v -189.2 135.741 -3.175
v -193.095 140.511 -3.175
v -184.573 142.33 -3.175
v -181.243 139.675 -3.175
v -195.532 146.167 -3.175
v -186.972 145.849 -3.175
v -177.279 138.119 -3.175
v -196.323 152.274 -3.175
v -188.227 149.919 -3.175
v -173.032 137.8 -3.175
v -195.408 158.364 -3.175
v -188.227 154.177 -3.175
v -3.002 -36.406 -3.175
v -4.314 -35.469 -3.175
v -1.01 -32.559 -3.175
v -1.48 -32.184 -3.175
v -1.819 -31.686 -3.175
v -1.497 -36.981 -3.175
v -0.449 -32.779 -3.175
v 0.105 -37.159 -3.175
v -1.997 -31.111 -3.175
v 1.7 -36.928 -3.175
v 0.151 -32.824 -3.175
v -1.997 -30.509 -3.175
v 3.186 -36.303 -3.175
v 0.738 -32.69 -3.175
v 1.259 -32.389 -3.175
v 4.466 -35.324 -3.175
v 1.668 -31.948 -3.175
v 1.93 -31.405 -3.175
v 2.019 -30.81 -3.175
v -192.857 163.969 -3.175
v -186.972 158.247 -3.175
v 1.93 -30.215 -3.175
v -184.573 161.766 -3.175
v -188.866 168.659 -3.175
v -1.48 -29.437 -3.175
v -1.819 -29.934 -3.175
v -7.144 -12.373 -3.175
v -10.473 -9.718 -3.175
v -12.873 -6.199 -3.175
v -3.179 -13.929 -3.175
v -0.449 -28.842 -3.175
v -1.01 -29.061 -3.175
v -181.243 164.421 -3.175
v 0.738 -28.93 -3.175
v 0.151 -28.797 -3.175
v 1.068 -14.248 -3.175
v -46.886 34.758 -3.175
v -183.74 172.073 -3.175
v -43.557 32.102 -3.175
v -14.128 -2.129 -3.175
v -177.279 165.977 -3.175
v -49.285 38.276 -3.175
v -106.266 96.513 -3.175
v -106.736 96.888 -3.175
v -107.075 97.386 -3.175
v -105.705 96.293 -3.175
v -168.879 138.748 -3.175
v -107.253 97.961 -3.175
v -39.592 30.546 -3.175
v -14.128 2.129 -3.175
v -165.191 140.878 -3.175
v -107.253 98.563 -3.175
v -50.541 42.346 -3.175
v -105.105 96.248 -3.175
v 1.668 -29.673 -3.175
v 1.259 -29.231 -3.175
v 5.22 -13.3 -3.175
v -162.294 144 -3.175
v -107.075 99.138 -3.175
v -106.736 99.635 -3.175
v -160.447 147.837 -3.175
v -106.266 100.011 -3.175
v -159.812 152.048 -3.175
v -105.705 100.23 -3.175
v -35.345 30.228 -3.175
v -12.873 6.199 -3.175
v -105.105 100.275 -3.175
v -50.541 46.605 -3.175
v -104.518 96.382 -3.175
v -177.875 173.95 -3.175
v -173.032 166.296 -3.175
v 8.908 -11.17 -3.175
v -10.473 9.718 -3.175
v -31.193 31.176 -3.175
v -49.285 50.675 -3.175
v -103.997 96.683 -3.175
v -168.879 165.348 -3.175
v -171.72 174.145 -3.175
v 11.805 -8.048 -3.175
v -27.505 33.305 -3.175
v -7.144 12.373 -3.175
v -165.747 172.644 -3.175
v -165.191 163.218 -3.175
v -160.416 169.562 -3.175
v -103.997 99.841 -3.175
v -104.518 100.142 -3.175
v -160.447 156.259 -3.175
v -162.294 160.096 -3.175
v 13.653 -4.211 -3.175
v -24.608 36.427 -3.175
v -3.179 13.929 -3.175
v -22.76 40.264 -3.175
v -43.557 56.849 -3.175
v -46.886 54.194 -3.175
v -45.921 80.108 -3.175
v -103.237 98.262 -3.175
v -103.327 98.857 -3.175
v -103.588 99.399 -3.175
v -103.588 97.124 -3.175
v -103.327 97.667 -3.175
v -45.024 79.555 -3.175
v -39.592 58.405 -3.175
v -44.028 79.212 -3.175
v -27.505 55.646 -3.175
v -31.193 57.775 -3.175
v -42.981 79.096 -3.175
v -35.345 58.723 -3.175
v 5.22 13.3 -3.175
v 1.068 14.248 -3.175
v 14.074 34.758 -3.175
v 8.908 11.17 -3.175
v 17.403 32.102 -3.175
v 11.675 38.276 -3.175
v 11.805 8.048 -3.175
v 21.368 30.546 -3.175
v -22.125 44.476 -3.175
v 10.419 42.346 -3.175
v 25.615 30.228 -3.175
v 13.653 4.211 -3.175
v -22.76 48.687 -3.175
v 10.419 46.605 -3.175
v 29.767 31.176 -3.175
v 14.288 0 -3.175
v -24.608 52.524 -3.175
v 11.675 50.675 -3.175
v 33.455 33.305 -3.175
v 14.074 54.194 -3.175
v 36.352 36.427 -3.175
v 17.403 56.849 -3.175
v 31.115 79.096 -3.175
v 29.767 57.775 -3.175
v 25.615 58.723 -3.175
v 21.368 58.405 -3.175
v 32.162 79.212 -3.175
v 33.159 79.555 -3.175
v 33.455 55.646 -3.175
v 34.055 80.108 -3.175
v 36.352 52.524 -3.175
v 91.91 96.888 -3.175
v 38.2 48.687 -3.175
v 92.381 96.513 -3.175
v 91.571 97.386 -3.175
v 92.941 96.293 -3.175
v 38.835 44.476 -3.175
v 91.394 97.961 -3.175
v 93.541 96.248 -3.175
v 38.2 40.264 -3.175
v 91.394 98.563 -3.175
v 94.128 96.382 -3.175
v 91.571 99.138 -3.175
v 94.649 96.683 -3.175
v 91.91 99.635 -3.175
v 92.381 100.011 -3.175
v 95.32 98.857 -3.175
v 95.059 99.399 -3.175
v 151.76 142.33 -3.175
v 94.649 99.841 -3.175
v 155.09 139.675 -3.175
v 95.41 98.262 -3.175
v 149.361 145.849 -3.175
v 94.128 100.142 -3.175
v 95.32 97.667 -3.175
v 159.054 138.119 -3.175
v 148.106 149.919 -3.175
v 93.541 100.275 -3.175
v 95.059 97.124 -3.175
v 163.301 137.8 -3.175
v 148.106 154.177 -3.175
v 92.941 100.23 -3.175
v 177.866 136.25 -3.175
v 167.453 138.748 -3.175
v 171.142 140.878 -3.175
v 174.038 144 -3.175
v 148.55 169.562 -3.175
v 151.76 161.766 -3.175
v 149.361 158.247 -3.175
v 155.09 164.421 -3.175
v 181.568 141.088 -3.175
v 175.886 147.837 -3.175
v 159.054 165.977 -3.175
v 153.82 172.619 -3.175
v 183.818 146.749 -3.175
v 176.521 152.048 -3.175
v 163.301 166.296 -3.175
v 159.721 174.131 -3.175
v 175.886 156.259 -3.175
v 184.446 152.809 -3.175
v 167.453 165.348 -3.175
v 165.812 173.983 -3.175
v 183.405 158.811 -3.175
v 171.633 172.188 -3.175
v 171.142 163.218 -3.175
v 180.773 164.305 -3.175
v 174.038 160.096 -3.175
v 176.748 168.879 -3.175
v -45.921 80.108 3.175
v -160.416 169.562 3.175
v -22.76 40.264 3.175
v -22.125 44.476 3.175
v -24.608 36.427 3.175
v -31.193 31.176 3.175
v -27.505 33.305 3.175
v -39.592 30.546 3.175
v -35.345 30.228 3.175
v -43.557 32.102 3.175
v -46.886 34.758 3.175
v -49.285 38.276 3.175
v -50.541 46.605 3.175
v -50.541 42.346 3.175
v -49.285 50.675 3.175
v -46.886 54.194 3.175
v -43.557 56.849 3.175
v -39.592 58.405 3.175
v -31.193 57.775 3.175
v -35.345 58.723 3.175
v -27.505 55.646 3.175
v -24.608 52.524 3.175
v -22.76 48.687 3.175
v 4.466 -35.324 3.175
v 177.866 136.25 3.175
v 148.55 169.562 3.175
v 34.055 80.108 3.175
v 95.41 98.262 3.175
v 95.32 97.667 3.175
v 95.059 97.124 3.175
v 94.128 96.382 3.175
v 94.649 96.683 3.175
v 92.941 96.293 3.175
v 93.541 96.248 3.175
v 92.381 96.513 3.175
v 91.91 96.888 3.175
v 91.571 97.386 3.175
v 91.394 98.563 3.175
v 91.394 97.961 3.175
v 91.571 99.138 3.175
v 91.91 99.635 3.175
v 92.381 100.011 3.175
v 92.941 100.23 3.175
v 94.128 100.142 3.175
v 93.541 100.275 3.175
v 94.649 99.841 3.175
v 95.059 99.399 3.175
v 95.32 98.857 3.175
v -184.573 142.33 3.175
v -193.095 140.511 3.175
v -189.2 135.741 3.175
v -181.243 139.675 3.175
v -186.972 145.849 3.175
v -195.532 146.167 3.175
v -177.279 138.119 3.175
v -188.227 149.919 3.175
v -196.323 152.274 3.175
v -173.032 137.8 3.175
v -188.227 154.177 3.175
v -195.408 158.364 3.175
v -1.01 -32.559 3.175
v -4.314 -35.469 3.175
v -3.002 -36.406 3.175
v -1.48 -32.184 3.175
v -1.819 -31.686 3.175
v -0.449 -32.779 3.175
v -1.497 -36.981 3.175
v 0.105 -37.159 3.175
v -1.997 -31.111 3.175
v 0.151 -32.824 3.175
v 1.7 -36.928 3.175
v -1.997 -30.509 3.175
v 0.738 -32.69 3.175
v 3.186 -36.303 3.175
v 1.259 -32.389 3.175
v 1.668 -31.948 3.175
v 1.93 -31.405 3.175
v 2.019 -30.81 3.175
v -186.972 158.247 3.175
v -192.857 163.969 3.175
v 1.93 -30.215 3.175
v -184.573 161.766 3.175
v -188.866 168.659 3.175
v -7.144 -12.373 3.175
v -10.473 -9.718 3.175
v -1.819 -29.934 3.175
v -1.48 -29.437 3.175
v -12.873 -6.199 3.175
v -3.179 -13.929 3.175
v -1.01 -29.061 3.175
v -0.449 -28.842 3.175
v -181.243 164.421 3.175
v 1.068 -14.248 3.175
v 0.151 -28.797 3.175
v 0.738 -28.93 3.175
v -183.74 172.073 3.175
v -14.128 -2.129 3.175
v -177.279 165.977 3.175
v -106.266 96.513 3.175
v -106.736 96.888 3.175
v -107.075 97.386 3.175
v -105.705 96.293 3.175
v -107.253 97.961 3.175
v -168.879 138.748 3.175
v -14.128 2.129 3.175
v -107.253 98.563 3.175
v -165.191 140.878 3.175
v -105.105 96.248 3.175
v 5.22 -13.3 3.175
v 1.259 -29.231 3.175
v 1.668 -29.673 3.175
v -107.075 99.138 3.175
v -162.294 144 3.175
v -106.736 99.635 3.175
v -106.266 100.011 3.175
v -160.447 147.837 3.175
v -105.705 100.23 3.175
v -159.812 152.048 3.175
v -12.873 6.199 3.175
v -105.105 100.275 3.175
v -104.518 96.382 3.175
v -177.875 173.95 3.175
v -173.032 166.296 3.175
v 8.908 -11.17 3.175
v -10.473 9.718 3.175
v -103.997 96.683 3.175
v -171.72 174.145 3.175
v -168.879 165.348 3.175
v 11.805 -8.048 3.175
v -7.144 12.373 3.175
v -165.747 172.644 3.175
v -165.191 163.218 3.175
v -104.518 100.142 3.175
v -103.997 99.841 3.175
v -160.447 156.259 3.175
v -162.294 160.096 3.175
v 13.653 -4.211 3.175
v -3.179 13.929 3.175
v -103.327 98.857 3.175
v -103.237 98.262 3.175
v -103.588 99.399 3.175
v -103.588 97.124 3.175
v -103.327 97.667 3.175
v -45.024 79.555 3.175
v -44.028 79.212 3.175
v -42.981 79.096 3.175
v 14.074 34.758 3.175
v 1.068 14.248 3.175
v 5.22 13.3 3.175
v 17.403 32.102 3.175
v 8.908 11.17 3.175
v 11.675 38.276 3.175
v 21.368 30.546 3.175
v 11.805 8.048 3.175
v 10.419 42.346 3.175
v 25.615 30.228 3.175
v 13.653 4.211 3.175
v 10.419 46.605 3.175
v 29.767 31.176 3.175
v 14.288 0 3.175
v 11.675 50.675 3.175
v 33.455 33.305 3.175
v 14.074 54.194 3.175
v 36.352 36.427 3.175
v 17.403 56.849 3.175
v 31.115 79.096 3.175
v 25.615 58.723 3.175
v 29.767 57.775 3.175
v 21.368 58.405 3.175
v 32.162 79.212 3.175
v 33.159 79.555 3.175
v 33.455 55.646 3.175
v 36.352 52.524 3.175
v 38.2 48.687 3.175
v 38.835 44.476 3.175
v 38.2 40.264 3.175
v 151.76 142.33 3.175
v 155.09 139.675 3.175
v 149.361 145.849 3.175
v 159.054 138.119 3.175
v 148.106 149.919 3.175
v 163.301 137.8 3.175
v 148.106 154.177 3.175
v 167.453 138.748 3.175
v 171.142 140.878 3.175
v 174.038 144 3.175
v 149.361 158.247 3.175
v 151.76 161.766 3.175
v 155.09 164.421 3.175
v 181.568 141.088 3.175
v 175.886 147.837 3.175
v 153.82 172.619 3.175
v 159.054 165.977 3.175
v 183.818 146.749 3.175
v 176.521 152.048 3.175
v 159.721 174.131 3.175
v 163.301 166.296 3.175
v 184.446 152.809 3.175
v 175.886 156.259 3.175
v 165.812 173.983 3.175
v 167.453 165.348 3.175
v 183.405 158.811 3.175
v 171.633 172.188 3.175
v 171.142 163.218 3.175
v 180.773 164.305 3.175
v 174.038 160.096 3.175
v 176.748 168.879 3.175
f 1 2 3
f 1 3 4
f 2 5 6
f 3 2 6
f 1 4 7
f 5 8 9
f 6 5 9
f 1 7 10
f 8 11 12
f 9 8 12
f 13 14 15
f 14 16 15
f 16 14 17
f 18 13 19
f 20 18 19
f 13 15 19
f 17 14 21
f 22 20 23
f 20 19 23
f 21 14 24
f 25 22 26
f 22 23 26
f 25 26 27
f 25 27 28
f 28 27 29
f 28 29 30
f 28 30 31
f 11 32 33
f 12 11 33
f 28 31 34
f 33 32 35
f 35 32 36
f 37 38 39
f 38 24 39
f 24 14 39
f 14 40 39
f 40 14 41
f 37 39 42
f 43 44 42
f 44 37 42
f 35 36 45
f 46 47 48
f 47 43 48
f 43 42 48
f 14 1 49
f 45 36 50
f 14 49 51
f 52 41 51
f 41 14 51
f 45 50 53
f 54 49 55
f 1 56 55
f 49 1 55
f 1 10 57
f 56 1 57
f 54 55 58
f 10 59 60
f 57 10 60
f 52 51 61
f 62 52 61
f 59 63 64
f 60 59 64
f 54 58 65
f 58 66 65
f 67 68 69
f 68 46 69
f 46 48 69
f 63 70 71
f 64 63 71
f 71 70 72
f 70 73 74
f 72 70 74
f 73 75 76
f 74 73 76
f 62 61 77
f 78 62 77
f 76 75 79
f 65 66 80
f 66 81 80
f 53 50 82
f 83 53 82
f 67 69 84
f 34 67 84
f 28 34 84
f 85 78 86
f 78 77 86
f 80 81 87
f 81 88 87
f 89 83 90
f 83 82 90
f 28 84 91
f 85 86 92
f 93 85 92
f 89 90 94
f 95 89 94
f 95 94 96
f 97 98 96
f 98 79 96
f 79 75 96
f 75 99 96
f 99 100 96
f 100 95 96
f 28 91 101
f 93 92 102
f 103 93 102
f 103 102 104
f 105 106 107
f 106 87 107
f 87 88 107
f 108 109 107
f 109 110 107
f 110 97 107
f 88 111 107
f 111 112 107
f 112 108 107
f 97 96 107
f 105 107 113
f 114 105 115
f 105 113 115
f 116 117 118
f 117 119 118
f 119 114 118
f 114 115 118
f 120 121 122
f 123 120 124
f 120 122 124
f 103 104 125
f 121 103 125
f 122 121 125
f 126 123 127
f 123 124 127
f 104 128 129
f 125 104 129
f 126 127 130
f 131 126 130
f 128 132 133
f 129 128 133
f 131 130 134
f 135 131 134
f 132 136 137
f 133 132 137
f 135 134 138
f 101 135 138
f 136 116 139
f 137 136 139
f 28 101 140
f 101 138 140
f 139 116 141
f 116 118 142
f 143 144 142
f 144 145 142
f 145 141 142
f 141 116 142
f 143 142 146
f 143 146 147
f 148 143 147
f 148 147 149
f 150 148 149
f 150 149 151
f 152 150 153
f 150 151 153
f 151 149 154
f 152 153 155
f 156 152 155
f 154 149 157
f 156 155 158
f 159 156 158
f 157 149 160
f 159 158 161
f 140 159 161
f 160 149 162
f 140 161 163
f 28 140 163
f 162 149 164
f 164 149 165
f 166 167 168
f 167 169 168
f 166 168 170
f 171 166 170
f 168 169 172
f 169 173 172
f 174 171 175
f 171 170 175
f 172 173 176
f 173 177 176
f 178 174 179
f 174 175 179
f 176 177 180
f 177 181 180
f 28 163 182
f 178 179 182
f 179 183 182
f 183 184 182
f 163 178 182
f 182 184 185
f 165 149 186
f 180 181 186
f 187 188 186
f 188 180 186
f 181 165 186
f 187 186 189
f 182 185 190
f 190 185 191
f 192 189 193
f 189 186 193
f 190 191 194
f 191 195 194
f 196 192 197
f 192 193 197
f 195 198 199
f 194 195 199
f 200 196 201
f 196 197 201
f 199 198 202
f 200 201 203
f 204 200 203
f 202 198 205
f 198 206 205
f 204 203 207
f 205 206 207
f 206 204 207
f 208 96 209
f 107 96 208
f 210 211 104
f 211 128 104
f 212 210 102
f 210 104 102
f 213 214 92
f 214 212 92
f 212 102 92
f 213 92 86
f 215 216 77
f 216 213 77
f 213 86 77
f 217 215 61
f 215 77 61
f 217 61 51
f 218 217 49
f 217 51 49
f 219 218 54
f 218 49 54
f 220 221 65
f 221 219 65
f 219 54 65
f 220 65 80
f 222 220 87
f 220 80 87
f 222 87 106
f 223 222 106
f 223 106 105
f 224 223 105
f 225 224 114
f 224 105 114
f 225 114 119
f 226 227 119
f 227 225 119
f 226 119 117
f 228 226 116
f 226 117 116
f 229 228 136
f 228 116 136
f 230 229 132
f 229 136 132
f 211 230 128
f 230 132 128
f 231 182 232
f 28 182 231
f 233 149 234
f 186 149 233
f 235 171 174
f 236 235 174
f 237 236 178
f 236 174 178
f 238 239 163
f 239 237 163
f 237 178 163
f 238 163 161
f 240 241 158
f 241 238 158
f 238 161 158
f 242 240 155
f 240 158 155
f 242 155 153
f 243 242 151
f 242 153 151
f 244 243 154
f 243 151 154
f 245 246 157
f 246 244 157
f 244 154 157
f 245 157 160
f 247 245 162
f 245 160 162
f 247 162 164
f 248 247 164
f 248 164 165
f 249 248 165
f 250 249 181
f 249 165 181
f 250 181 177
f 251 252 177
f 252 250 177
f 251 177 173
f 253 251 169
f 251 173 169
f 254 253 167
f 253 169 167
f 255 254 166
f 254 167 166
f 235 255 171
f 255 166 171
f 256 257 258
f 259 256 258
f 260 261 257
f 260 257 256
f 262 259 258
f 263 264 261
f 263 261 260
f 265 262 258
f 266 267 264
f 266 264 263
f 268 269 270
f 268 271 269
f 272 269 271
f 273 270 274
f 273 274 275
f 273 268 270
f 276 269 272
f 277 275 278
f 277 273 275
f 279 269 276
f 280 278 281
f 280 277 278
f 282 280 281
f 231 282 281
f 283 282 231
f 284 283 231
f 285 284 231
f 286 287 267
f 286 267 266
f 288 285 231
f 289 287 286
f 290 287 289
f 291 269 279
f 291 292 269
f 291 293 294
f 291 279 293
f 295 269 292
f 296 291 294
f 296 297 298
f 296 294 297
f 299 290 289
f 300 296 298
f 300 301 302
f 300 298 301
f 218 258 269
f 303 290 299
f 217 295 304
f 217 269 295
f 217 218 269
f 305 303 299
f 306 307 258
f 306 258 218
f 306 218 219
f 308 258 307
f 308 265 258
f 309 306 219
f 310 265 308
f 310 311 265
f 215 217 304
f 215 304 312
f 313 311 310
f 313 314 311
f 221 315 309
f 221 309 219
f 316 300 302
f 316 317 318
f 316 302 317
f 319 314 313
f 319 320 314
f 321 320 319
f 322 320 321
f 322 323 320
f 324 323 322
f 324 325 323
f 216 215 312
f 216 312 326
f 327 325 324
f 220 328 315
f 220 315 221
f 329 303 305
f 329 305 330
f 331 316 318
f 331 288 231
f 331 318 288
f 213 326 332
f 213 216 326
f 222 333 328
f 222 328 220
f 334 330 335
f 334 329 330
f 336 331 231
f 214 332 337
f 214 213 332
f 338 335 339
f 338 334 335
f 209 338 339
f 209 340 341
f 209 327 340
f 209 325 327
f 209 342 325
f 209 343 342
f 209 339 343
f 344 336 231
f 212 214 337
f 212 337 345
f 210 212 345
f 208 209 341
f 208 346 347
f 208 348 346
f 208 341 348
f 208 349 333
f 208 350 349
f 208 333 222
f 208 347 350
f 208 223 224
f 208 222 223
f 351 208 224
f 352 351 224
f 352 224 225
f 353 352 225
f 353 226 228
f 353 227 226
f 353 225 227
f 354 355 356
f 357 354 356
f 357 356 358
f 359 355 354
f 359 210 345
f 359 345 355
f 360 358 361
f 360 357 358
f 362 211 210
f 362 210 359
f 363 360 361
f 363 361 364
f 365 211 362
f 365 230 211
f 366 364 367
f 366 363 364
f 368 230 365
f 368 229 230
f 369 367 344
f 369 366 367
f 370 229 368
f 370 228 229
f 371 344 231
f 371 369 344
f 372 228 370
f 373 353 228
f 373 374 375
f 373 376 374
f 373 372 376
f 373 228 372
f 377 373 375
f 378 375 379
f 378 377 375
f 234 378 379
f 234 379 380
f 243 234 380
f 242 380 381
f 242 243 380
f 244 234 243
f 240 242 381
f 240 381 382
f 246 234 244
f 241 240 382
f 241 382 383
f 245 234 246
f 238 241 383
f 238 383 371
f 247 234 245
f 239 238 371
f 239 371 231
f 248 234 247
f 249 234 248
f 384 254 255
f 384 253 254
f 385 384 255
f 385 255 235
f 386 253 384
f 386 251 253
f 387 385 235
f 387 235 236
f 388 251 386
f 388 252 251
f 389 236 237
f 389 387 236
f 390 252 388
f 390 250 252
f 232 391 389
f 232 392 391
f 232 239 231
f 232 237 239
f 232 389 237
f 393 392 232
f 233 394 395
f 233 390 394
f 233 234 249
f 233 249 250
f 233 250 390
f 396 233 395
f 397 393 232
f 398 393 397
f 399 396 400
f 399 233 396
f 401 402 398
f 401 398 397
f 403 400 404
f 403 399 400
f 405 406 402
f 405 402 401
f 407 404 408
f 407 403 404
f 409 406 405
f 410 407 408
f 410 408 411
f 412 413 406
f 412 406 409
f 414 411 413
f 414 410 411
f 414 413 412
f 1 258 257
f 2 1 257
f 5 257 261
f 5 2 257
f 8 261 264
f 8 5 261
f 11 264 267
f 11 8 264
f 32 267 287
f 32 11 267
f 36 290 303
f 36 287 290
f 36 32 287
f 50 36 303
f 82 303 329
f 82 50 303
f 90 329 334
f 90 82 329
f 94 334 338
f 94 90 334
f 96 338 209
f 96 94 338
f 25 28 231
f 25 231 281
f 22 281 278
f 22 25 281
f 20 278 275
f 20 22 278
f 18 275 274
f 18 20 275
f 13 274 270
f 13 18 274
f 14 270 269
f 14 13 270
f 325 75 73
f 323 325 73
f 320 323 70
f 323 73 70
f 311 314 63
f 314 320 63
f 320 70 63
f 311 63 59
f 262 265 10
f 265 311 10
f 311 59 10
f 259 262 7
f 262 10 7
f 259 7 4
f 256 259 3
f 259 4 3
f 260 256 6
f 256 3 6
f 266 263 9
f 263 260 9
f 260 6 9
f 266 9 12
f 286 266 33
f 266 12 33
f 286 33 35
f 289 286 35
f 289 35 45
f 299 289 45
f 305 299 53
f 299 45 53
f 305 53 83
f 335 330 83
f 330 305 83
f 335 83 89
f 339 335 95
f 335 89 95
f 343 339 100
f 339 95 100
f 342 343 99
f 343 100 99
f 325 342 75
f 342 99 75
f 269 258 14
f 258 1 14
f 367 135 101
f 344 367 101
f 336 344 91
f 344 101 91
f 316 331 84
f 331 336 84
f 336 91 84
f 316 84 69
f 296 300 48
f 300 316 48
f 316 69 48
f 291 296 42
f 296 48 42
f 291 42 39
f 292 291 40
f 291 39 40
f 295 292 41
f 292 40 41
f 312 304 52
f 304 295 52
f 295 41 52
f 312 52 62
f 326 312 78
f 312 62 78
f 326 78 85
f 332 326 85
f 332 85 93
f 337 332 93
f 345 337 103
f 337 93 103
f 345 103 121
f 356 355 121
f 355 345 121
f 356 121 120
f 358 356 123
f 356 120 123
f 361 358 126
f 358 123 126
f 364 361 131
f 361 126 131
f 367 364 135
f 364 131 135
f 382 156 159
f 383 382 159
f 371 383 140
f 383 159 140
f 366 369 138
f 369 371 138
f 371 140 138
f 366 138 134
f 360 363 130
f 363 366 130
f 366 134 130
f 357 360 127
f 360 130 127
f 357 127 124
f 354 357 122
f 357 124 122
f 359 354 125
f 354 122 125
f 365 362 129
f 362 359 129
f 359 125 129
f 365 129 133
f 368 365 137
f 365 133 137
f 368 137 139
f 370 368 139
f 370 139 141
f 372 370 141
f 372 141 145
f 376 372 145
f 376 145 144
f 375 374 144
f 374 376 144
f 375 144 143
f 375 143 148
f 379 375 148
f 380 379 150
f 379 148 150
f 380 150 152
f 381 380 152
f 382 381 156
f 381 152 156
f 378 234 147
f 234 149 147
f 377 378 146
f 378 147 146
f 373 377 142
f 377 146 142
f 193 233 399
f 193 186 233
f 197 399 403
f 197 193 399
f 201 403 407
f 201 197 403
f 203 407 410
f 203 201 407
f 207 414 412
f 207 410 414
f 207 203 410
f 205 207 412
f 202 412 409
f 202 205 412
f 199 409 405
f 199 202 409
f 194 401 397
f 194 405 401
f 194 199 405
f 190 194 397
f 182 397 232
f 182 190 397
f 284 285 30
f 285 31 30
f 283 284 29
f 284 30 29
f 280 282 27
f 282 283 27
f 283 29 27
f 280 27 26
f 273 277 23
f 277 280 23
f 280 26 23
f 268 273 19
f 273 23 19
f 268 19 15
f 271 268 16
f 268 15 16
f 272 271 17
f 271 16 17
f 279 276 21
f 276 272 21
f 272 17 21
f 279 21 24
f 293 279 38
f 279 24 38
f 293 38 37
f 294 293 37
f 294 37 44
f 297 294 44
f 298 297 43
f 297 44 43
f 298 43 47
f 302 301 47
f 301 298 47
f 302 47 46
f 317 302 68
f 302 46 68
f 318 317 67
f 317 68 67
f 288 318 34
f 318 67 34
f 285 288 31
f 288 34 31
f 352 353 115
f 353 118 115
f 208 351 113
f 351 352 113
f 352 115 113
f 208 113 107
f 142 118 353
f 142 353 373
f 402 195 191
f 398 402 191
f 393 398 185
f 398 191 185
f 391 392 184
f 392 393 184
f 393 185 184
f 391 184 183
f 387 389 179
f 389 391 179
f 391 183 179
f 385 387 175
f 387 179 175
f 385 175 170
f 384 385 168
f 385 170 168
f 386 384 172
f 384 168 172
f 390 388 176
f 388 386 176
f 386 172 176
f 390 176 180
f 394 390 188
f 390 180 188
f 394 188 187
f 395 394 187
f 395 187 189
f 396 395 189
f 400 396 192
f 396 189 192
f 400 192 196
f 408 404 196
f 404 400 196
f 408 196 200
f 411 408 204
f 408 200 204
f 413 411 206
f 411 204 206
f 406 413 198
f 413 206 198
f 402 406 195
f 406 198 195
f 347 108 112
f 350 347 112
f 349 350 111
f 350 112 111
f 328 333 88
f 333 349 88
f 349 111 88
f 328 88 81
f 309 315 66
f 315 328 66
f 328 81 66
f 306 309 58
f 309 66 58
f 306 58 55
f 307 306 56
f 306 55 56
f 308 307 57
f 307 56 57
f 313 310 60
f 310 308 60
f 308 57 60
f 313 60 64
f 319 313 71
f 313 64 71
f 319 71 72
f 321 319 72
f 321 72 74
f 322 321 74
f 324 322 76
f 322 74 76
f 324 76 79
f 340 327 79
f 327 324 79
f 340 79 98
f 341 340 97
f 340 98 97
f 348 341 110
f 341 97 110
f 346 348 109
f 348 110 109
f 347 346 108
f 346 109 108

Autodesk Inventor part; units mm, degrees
ref_plane "YZ Plane" through (0, 0, 0) normal (1, 0, 0) x (0, 1, 0)
ref_plane "XZ Plane" through (0, 0, 0) normal (0, 1, 0) x (-1, 0, 0)
ref_plane "XY Plane" through (0, 0, 0) normal (0, 0, 1) x (1, 0, 0)
sketch "Sketch1" plane through (0, 0, 0) normal (0, 0, 1) x (1, 0, 0)
  circle A0 centre (0, 0) radius 20.32 construction
  circle A1 centre (0, 0) radius 22.86 construction
  circle A2 centre (24.5471, 44.4756) radius 30.48 construction
  circle A3 centre (-36.4129, 44.4756) radius 30.48 construction
  circle A4 centre (-36.4129, 44.4756) radius 33.02 construction
  line L0 (-15.4952, 18.9262) -> (-14.4815, 17.688)
  circle A5 centre (24.5471, 44.4756) radius 33.02 construction
  circle A6 centre (24.5471, 44.4756) radius 14.2875
  circle A7 centre (-36.4129, 44.4756) radius 14.2875
  circle A8 centre (0, 0) radius 14.2875
  circle A9 centre (24.5471, 44.4756) radius 19.1008 construction
  circle A10 centre (24.5471, 44.4756) radius 21.0058 construction
  circle A11 centre (-36.4129, 44.4756) radius 19.1008 construction
  circle A12 centre (-36.4129, 44.4756) radius 21.0058 construction
  line L1 (-36.4129, 44.4756) -> (-174.0993, 152.048) construction
  line L2 (24.5471, 44.4756) -> (162.2336, 152.048) construction
  circle A13 centre (-174.0993, 152.048) radius 14.2875
  circle A14 centre (162.2336, 152.048) radius 14.2875
  circle A15 centre (-174.0993, 152.048) radius 22.225 construction
  circle A16 centre (162.2336, 152.048) radius 22.225 construction
  line L3 (-160.4162, 169.5616) -> (-45.921, 80.1081)
  line L4 (-42.9811, 79.0958) -> (31.1154, 79.0958)
  arc A17 (31.1154, 79.0958) -> (34.0553, 80.1081) centre (31.1154, 83.871) ccw
  arc A18 (-45.921, 80.1081) -> (-42.9811, 79.0958) centre (-42.9811, 83.871) ccw
  line L5 (34.0553, 80.1081) -> (148.5505, 169.5616)
  line L6 (-36.4129, 79.0958) -> (-36.4129, 77.4956) construction
  arc A19 (177.8656, 136.2496) -> (148.5505, 169.5616) centre (162.2336, 152.048) ccw
  arc A20 (-160.4162, 169.5616) -> (-189.2001, 135.7411) centre (-174.0993, 152.048) ccw
  circle A21 centre (-105.2561, 98.2618) radius 2.0193
  circle A22 centre (0, -30.8102) radius 6.35 construction
  circle A23 centre (0, -30.8102) radius 2.0193
  line L7 (0, -22.86) -> (0, -24.4602)
  line L8 (-189.2001, 135.7411) -> (-4.3145, -35.4693)
  line L9 (177.8656, 136.2496) -> (4.4663, -35.324)
  arc A24 (-4.3145, -35.4693) -> (4.4663, -35.324) centre (0, -30.8102) ccw
  circle A25 centre (-105.2561, 98.2618) radius 6.35 construction
  circle A26 centre (93.3904, 98.2618) radius 6.35 construction
  circle A27 centre (93.3904, 98.2618) radius 2.0193
  circle A28 centre (-174.0993, 152.048) radius 50.8 construction
  circle A29 centre (162.2336, 152.048) radius 50.8 construction
  line L10 (-333.708, 192.5945) -> (-312.3217, 152.048) construction
  dimension "d0" = 40.64
  dimension "d3" = 2.54
  dimension "d9" = 60.96
  dimension "d10" = 2.54
  dimension "d12" = 1.6002
  dimension "d13" = 28.575
  dimension "d14" = 38.2016
  dimension "d15" = 42.0116
  dimension "d16" = 174.7266
  dimension "d17" = 104
  dimension "d18" = 28.575
  dimension "d24" = 44.45
  dimension "d25" = 44.45
  dimension "d37" = 4.7752
  dimension "d38" = 1.6002
  dimension "d39" = 4.0386
  dimension "d40" = 12.7
  dimension "d41" = 4.0386
  dimension "d42" = 1.6002
  dimension "d43" = 12.7
  dimension "d44" = 12.7
  dimension "d45" = 4.0386
  dimension "d46" = 87.3633
  dimension "d47" = 87.3633
  dimension "d48" = 101.6
  dimension "d49" = 101.6
extrude "Extrusion1" add sketch "Sketch1" along normal mid plane 6.35
properties part number "Gearbox #2 Plate" material "Aluminum 6061"
